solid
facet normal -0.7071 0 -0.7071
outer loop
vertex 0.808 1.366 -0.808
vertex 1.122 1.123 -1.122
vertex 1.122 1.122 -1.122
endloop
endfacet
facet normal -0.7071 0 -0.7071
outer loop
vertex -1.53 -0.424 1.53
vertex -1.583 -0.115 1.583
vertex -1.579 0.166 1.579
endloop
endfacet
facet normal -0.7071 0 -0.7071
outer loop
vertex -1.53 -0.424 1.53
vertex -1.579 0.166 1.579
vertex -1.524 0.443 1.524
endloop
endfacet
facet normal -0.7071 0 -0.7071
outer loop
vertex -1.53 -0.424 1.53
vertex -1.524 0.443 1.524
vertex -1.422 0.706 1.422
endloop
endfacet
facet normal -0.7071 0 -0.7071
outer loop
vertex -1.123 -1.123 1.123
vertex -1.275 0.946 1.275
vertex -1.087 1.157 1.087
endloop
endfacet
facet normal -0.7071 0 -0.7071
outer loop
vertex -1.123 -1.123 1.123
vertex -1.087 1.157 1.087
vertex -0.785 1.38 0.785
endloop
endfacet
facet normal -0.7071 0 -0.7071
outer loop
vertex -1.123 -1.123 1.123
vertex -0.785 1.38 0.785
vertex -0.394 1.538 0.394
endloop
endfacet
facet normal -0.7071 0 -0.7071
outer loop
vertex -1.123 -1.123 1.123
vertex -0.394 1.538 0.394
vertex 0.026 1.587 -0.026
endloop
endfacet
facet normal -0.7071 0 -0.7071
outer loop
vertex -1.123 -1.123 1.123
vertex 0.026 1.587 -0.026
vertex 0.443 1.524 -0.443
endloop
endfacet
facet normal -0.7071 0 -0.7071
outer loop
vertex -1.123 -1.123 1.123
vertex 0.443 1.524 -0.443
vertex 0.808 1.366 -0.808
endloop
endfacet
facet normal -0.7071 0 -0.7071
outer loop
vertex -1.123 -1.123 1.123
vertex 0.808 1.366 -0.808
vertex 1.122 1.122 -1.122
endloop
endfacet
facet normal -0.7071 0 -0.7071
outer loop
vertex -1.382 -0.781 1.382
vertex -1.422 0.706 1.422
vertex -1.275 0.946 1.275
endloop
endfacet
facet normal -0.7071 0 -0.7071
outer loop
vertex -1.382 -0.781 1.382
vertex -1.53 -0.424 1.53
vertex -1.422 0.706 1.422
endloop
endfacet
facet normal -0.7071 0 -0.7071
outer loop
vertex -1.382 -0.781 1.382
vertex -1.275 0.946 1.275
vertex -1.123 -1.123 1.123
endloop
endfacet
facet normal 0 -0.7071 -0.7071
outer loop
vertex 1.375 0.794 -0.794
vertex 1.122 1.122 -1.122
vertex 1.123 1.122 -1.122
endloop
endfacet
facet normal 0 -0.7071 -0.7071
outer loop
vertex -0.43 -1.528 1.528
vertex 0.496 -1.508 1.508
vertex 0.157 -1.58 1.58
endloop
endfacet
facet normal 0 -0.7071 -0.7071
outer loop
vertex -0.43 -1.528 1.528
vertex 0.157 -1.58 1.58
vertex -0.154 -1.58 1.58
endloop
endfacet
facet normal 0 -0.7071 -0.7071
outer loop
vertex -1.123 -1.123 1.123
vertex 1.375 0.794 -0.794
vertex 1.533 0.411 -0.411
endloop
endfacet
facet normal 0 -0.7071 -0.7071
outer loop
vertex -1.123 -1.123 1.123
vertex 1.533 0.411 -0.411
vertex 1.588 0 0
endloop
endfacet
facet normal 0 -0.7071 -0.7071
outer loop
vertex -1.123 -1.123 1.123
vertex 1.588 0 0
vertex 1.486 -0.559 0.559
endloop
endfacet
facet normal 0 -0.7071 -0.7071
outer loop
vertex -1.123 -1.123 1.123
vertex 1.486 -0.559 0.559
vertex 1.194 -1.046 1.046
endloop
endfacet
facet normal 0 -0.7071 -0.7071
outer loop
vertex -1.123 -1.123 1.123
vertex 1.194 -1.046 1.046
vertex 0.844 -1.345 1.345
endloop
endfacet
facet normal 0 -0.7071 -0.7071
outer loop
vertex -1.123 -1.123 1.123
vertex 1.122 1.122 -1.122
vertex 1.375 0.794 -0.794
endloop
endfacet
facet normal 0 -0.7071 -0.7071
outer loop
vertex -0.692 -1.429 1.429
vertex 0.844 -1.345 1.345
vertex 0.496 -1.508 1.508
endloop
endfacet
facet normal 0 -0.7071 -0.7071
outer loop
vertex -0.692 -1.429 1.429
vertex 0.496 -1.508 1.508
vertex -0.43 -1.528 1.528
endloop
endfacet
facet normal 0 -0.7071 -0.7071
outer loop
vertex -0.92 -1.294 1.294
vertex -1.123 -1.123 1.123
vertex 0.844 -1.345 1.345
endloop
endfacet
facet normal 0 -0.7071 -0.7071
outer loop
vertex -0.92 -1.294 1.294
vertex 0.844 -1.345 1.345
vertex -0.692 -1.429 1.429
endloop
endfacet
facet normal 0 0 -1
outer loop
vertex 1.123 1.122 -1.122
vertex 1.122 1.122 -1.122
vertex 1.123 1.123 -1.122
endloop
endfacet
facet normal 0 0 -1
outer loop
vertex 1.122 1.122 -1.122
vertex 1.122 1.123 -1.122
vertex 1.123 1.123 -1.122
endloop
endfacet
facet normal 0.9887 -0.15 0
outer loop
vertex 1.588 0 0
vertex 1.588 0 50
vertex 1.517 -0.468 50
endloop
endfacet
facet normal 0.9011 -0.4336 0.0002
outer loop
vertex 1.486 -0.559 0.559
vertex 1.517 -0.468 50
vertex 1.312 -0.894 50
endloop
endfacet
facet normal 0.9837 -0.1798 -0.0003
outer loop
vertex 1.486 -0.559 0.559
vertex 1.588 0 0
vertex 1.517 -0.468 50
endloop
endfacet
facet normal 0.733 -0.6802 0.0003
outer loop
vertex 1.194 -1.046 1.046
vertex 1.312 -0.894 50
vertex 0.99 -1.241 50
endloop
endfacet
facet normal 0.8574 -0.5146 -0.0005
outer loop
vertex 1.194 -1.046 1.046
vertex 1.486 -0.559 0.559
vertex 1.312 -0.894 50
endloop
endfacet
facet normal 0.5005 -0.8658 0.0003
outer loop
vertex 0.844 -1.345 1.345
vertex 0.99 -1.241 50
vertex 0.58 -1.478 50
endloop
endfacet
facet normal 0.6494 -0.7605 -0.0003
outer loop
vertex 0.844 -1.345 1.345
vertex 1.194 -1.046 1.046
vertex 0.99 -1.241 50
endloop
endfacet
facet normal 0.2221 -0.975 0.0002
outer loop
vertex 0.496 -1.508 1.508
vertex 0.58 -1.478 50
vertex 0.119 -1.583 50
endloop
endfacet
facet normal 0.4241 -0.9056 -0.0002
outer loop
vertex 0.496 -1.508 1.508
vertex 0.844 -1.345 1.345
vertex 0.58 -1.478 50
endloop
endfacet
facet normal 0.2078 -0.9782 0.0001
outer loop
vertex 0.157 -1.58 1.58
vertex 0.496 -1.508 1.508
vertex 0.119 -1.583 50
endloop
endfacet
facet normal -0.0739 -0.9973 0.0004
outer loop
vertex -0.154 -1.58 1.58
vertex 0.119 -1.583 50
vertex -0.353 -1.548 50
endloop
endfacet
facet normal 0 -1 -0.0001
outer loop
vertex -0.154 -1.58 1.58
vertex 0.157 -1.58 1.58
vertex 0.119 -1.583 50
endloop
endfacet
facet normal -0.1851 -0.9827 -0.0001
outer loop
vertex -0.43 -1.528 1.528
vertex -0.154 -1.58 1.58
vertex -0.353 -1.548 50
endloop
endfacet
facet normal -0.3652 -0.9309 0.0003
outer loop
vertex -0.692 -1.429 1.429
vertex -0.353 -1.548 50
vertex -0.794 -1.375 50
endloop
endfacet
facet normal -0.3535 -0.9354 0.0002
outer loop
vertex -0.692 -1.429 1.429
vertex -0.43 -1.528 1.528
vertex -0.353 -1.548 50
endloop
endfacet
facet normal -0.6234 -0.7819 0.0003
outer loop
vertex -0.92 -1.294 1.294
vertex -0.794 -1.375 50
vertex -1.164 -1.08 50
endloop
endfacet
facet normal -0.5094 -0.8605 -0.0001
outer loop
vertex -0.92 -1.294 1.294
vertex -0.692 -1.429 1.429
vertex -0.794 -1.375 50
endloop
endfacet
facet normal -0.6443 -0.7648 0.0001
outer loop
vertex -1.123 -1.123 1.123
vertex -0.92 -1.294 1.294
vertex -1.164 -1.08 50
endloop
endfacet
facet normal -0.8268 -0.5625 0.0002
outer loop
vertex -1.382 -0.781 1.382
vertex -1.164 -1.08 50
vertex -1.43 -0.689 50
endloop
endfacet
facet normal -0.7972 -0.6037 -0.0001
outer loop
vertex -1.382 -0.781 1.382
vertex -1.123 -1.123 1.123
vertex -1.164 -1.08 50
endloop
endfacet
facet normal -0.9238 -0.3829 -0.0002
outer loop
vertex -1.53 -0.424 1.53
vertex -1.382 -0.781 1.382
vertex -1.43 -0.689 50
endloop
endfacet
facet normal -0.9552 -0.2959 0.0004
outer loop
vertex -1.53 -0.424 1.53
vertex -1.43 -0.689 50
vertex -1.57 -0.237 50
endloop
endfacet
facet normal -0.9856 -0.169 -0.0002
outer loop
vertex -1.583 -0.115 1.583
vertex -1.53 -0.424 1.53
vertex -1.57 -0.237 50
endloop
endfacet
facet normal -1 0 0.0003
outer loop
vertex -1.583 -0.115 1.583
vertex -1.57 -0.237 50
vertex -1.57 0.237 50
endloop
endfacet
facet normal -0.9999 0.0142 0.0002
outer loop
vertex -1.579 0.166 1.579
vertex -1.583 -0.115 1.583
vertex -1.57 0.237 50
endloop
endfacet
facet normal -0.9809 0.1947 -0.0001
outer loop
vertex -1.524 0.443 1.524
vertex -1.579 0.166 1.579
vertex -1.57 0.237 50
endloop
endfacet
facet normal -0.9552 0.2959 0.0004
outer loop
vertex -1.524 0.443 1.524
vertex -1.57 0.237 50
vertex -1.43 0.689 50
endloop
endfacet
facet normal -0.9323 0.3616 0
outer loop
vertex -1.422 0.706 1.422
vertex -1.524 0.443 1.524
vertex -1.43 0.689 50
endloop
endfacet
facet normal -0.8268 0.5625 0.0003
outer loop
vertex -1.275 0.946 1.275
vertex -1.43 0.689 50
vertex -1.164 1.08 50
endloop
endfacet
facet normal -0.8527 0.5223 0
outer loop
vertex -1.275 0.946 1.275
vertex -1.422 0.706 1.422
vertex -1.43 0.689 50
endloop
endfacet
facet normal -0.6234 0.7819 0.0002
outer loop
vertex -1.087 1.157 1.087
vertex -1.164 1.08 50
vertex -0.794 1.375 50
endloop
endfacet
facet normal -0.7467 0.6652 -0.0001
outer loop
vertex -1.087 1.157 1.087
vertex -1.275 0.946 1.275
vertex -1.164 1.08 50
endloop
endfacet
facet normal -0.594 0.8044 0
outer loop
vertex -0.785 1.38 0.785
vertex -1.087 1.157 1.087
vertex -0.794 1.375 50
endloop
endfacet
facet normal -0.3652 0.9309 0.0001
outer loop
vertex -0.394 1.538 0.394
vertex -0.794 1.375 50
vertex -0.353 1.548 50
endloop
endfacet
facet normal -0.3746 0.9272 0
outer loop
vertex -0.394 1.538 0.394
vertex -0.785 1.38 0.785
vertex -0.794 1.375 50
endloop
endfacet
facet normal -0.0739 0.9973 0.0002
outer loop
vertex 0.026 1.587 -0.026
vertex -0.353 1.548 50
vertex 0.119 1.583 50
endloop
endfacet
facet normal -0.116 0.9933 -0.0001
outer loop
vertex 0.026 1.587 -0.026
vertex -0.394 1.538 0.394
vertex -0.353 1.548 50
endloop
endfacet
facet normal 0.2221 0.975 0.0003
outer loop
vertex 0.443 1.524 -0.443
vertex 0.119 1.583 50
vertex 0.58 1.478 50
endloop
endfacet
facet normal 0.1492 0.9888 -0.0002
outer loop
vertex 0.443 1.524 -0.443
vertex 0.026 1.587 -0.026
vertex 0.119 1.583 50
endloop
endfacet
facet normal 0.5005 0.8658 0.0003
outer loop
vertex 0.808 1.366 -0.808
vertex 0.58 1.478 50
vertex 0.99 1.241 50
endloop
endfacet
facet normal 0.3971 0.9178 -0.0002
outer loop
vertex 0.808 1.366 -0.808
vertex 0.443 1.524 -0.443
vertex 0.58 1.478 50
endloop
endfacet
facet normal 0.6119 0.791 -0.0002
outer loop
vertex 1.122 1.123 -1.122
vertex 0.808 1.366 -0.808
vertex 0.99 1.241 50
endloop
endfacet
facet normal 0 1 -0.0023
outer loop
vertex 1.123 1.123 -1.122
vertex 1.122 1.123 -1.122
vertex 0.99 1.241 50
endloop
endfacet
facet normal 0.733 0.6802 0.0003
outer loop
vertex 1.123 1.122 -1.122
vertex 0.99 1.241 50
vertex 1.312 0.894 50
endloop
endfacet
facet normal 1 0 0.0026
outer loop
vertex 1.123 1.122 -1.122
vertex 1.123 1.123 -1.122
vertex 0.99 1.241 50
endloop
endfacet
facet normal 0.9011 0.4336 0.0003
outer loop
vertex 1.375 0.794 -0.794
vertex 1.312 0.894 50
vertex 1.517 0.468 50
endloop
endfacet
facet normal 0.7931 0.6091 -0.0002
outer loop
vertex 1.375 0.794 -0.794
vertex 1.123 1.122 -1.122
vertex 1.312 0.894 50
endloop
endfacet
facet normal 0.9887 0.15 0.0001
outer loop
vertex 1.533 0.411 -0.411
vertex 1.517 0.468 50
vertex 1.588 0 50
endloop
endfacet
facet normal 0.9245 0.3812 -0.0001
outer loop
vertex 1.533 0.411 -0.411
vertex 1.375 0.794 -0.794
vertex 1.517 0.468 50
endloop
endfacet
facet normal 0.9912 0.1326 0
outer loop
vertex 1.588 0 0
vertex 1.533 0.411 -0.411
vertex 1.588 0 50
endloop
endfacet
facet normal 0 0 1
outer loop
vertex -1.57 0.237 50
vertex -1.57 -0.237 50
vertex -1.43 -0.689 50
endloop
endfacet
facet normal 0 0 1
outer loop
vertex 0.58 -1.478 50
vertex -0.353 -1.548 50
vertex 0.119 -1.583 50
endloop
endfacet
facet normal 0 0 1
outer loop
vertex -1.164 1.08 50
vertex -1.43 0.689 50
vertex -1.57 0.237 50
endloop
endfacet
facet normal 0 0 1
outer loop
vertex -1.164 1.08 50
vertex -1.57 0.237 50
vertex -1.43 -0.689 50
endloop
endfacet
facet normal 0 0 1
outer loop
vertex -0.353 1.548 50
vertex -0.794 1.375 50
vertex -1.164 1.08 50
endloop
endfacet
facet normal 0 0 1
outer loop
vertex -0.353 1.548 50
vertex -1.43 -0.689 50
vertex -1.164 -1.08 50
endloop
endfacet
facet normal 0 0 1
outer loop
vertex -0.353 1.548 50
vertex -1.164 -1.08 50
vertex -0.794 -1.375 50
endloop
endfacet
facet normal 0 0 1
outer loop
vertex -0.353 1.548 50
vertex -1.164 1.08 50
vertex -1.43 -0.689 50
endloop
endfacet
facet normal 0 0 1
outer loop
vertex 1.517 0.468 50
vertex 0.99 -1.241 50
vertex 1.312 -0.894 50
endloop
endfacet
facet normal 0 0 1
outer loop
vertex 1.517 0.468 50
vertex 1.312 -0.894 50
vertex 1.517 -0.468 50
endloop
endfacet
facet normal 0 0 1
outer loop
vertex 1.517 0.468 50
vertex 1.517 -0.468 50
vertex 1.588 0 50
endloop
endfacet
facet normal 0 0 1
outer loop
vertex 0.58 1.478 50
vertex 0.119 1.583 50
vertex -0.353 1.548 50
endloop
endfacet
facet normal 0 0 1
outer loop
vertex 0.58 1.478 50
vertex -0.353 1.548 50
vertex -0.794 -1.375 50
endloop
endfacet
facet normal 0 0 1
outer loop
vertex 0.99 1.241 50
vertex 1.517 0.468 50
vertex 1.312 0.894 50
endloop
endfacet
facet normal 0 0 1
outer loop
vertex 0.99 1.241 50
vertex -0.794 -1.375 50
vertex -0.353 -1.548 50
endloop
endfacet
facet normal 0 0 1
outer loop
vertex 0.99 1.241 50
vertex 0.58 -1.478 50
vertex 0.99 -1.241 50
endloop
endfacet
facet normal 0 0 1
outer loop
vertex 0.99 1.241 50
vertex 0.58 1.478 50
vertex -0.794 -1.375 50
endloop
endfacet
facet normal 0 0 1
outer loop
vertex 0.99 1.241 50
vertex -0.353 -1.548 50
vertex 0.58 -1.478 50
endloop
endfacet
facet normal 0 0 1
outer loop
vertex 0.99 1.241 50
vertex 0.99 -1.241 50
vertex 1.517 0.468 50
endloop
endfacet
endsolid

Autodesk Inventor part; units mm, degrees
ref_plane "Start Plane" through (0, 0, -1.1225) normal (0, 0, 1) x (1, 0, 0)
ref_plane "End Plane" through (0, 0, 50) normal (0, 0, 1) x (1, 0, 0)
sketch "Sketch" plane through (0, 0, 0) normal (0, 0, 1) x (1, 0, 0)
  circle A0 centre (0, 0) radius 1.5875
  dimension "d0" = 3.175
extrude "Body" add sketch "Sketch" along normal up to surface (51.1225 mm away) from surface at -1.1225
sketch "Sketch2" plane through (0, 0, 0) normal (0, 0, 1) x (1, 0, 0)
  line L0 (0, 0) -> (10, 0)
ref_plane "Work Plane3" through (0, 0, 0) normal (0, -1, 0) x (1, 0, 0)
sketch "Sketch3" plane through (0, 0, 0) normal (0, -1, 0) x (1, 0, 0)
  line L0 (-2, -1.1225) -> (12, -1.1225)
  line L1 (-2, 50) -> (12, 50)
  dimension "d7" = 51.1225
ref_plane "Work Plane4" through (1.5875, 0, -1.5875) normal (-0.7071, 0, -0.7071) x (-0.7071, 0, 0.7071)
split "Split1" plane through (1.5875, 0, -1.5875) removes the side toward (-0.7071, 0, -0.7071)
ref_plane "Work Plane5" through (0, 1.5875, -1.5875) normal (0, -0.7071, -0.7071) x (1, 0, 0)
split "Split2" plane through (0, 1.5875, -1.5875) removes the side toward (0, -0.7071, -0.7071)
equation "\"d0\" = Diam"
equation "\"d1\" = G_L"
equation "\"Diam\" = 3.175"
equation "\"G_L\" = d7"
equation "\"G_OFFSET_START\" = 1.12253"
equation "\"G_OFFSET_END\" = 0"
equation "\"d4\" = -G_OFFSET_START"
equation "\"d5\" = G_OFFSET_END + B_L"
equation "\"B_L\" = 50"
properties part number "ANSI/AISC Rolled Steel - 1/8-2,013, RB" material "Steel, Mild"
